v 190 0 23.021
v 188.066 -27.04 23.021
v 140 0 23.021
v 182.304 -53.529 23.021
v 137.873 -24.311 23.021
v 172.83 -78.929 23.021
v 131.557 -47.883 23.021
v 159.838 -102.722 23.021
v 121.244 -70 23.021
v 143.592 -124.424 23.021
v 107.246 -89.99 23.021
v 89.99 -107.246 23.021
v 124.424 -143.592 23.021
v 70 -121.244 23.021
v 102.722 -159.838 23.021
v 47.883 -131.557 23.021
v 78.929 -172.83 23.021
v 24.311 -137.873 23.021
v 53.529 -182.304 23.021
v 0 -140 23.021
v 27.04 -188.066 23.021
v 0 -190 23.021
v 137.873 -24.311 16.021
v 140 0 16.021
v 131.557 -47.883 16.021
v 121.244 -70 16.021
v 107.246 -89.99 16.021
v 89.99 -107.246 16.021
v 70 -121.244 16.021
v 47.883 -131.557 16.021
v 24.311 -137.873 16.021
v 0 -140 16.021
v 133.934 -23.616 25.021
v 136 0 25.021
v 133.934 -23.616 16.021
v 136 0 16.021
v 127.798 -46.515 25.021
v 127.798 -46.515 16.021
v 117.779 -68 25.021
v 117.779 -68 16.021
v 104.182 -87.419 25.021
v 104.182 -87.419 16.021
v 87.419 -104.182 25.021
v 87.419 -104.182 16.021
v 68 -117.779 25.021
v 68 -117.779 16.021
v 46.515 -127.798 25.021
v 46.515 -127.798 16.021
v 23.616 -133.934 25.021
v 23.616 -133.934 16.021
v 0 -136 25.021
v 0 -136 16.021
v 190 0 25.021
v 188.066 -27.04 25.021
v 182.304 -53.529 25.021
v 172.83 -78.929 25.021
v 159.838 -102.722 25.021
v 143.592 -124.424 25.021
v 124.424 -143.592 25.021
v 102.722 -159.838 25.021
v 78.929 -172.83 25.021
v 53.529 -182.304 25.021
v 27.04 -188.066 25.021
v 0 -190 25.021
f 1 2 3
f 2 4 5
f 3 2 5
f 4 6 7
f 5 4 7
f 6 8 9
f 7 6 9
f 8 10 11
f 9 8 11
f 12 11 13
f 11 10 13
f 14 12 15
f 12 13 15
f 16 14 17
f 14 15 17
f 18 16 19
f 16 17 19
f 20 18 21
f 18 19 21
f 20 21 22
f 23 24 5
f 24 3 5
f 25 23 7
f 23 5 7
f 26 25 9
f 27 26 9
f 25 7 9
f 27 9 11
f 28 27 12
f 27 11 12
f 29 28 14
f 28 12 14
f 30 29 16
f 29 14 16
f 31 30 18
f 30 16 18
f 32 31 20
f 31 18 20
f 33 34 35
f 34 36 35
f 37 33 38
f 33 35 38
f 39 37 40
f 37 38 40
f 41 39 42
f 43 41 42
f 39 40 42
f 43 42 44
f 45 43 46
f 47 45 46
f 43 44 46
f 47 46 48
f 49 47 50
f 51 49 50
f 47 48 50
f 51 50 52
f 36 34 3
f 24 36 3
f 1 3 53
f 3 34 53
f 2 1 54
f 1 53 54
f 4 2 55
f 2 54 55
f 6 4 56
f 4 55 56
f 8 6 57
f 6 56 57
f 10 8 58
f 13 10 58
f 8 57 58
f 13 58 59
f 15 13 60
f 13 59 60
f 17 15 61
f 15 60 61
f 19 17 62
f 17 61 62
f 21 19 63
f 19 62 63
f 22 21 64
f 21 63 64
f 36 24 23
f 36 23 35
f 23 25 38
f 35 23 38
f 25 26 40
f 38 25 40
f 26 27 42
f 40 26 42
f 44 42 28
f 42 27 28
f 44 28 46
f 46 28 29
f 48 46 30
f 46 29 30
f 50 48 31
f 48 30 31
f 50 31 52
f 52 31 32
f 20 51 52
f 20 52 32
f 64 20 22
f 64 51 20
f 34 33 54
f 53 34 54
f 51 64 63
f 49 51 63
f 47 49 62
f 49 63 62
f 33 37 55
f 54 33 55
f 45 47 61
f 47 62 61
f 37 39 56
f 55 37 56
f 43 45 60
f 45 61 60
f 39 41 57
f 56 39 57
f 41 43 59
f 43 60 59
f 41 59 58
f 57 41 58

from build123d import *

# Parameters (mm, degrees)
REVOLUTION_ANGLE = -90


with BuildPart() as part:
    # Sketch → Revolution (revolve)
    with BuildSketch(Plane.XZ):
        Polygon((140, 25.020922), (136, 25.020922), (136, 16.020922), (140, 16.020922), (140, 23.020922), (190, 23.020922), (190, 25.020922), align=None)
    revolve(axis=Axis((0, 0, 0), (0, 0, 1)), revolution_arc=REVOLUTION_ANGLE)


solid = part.part
